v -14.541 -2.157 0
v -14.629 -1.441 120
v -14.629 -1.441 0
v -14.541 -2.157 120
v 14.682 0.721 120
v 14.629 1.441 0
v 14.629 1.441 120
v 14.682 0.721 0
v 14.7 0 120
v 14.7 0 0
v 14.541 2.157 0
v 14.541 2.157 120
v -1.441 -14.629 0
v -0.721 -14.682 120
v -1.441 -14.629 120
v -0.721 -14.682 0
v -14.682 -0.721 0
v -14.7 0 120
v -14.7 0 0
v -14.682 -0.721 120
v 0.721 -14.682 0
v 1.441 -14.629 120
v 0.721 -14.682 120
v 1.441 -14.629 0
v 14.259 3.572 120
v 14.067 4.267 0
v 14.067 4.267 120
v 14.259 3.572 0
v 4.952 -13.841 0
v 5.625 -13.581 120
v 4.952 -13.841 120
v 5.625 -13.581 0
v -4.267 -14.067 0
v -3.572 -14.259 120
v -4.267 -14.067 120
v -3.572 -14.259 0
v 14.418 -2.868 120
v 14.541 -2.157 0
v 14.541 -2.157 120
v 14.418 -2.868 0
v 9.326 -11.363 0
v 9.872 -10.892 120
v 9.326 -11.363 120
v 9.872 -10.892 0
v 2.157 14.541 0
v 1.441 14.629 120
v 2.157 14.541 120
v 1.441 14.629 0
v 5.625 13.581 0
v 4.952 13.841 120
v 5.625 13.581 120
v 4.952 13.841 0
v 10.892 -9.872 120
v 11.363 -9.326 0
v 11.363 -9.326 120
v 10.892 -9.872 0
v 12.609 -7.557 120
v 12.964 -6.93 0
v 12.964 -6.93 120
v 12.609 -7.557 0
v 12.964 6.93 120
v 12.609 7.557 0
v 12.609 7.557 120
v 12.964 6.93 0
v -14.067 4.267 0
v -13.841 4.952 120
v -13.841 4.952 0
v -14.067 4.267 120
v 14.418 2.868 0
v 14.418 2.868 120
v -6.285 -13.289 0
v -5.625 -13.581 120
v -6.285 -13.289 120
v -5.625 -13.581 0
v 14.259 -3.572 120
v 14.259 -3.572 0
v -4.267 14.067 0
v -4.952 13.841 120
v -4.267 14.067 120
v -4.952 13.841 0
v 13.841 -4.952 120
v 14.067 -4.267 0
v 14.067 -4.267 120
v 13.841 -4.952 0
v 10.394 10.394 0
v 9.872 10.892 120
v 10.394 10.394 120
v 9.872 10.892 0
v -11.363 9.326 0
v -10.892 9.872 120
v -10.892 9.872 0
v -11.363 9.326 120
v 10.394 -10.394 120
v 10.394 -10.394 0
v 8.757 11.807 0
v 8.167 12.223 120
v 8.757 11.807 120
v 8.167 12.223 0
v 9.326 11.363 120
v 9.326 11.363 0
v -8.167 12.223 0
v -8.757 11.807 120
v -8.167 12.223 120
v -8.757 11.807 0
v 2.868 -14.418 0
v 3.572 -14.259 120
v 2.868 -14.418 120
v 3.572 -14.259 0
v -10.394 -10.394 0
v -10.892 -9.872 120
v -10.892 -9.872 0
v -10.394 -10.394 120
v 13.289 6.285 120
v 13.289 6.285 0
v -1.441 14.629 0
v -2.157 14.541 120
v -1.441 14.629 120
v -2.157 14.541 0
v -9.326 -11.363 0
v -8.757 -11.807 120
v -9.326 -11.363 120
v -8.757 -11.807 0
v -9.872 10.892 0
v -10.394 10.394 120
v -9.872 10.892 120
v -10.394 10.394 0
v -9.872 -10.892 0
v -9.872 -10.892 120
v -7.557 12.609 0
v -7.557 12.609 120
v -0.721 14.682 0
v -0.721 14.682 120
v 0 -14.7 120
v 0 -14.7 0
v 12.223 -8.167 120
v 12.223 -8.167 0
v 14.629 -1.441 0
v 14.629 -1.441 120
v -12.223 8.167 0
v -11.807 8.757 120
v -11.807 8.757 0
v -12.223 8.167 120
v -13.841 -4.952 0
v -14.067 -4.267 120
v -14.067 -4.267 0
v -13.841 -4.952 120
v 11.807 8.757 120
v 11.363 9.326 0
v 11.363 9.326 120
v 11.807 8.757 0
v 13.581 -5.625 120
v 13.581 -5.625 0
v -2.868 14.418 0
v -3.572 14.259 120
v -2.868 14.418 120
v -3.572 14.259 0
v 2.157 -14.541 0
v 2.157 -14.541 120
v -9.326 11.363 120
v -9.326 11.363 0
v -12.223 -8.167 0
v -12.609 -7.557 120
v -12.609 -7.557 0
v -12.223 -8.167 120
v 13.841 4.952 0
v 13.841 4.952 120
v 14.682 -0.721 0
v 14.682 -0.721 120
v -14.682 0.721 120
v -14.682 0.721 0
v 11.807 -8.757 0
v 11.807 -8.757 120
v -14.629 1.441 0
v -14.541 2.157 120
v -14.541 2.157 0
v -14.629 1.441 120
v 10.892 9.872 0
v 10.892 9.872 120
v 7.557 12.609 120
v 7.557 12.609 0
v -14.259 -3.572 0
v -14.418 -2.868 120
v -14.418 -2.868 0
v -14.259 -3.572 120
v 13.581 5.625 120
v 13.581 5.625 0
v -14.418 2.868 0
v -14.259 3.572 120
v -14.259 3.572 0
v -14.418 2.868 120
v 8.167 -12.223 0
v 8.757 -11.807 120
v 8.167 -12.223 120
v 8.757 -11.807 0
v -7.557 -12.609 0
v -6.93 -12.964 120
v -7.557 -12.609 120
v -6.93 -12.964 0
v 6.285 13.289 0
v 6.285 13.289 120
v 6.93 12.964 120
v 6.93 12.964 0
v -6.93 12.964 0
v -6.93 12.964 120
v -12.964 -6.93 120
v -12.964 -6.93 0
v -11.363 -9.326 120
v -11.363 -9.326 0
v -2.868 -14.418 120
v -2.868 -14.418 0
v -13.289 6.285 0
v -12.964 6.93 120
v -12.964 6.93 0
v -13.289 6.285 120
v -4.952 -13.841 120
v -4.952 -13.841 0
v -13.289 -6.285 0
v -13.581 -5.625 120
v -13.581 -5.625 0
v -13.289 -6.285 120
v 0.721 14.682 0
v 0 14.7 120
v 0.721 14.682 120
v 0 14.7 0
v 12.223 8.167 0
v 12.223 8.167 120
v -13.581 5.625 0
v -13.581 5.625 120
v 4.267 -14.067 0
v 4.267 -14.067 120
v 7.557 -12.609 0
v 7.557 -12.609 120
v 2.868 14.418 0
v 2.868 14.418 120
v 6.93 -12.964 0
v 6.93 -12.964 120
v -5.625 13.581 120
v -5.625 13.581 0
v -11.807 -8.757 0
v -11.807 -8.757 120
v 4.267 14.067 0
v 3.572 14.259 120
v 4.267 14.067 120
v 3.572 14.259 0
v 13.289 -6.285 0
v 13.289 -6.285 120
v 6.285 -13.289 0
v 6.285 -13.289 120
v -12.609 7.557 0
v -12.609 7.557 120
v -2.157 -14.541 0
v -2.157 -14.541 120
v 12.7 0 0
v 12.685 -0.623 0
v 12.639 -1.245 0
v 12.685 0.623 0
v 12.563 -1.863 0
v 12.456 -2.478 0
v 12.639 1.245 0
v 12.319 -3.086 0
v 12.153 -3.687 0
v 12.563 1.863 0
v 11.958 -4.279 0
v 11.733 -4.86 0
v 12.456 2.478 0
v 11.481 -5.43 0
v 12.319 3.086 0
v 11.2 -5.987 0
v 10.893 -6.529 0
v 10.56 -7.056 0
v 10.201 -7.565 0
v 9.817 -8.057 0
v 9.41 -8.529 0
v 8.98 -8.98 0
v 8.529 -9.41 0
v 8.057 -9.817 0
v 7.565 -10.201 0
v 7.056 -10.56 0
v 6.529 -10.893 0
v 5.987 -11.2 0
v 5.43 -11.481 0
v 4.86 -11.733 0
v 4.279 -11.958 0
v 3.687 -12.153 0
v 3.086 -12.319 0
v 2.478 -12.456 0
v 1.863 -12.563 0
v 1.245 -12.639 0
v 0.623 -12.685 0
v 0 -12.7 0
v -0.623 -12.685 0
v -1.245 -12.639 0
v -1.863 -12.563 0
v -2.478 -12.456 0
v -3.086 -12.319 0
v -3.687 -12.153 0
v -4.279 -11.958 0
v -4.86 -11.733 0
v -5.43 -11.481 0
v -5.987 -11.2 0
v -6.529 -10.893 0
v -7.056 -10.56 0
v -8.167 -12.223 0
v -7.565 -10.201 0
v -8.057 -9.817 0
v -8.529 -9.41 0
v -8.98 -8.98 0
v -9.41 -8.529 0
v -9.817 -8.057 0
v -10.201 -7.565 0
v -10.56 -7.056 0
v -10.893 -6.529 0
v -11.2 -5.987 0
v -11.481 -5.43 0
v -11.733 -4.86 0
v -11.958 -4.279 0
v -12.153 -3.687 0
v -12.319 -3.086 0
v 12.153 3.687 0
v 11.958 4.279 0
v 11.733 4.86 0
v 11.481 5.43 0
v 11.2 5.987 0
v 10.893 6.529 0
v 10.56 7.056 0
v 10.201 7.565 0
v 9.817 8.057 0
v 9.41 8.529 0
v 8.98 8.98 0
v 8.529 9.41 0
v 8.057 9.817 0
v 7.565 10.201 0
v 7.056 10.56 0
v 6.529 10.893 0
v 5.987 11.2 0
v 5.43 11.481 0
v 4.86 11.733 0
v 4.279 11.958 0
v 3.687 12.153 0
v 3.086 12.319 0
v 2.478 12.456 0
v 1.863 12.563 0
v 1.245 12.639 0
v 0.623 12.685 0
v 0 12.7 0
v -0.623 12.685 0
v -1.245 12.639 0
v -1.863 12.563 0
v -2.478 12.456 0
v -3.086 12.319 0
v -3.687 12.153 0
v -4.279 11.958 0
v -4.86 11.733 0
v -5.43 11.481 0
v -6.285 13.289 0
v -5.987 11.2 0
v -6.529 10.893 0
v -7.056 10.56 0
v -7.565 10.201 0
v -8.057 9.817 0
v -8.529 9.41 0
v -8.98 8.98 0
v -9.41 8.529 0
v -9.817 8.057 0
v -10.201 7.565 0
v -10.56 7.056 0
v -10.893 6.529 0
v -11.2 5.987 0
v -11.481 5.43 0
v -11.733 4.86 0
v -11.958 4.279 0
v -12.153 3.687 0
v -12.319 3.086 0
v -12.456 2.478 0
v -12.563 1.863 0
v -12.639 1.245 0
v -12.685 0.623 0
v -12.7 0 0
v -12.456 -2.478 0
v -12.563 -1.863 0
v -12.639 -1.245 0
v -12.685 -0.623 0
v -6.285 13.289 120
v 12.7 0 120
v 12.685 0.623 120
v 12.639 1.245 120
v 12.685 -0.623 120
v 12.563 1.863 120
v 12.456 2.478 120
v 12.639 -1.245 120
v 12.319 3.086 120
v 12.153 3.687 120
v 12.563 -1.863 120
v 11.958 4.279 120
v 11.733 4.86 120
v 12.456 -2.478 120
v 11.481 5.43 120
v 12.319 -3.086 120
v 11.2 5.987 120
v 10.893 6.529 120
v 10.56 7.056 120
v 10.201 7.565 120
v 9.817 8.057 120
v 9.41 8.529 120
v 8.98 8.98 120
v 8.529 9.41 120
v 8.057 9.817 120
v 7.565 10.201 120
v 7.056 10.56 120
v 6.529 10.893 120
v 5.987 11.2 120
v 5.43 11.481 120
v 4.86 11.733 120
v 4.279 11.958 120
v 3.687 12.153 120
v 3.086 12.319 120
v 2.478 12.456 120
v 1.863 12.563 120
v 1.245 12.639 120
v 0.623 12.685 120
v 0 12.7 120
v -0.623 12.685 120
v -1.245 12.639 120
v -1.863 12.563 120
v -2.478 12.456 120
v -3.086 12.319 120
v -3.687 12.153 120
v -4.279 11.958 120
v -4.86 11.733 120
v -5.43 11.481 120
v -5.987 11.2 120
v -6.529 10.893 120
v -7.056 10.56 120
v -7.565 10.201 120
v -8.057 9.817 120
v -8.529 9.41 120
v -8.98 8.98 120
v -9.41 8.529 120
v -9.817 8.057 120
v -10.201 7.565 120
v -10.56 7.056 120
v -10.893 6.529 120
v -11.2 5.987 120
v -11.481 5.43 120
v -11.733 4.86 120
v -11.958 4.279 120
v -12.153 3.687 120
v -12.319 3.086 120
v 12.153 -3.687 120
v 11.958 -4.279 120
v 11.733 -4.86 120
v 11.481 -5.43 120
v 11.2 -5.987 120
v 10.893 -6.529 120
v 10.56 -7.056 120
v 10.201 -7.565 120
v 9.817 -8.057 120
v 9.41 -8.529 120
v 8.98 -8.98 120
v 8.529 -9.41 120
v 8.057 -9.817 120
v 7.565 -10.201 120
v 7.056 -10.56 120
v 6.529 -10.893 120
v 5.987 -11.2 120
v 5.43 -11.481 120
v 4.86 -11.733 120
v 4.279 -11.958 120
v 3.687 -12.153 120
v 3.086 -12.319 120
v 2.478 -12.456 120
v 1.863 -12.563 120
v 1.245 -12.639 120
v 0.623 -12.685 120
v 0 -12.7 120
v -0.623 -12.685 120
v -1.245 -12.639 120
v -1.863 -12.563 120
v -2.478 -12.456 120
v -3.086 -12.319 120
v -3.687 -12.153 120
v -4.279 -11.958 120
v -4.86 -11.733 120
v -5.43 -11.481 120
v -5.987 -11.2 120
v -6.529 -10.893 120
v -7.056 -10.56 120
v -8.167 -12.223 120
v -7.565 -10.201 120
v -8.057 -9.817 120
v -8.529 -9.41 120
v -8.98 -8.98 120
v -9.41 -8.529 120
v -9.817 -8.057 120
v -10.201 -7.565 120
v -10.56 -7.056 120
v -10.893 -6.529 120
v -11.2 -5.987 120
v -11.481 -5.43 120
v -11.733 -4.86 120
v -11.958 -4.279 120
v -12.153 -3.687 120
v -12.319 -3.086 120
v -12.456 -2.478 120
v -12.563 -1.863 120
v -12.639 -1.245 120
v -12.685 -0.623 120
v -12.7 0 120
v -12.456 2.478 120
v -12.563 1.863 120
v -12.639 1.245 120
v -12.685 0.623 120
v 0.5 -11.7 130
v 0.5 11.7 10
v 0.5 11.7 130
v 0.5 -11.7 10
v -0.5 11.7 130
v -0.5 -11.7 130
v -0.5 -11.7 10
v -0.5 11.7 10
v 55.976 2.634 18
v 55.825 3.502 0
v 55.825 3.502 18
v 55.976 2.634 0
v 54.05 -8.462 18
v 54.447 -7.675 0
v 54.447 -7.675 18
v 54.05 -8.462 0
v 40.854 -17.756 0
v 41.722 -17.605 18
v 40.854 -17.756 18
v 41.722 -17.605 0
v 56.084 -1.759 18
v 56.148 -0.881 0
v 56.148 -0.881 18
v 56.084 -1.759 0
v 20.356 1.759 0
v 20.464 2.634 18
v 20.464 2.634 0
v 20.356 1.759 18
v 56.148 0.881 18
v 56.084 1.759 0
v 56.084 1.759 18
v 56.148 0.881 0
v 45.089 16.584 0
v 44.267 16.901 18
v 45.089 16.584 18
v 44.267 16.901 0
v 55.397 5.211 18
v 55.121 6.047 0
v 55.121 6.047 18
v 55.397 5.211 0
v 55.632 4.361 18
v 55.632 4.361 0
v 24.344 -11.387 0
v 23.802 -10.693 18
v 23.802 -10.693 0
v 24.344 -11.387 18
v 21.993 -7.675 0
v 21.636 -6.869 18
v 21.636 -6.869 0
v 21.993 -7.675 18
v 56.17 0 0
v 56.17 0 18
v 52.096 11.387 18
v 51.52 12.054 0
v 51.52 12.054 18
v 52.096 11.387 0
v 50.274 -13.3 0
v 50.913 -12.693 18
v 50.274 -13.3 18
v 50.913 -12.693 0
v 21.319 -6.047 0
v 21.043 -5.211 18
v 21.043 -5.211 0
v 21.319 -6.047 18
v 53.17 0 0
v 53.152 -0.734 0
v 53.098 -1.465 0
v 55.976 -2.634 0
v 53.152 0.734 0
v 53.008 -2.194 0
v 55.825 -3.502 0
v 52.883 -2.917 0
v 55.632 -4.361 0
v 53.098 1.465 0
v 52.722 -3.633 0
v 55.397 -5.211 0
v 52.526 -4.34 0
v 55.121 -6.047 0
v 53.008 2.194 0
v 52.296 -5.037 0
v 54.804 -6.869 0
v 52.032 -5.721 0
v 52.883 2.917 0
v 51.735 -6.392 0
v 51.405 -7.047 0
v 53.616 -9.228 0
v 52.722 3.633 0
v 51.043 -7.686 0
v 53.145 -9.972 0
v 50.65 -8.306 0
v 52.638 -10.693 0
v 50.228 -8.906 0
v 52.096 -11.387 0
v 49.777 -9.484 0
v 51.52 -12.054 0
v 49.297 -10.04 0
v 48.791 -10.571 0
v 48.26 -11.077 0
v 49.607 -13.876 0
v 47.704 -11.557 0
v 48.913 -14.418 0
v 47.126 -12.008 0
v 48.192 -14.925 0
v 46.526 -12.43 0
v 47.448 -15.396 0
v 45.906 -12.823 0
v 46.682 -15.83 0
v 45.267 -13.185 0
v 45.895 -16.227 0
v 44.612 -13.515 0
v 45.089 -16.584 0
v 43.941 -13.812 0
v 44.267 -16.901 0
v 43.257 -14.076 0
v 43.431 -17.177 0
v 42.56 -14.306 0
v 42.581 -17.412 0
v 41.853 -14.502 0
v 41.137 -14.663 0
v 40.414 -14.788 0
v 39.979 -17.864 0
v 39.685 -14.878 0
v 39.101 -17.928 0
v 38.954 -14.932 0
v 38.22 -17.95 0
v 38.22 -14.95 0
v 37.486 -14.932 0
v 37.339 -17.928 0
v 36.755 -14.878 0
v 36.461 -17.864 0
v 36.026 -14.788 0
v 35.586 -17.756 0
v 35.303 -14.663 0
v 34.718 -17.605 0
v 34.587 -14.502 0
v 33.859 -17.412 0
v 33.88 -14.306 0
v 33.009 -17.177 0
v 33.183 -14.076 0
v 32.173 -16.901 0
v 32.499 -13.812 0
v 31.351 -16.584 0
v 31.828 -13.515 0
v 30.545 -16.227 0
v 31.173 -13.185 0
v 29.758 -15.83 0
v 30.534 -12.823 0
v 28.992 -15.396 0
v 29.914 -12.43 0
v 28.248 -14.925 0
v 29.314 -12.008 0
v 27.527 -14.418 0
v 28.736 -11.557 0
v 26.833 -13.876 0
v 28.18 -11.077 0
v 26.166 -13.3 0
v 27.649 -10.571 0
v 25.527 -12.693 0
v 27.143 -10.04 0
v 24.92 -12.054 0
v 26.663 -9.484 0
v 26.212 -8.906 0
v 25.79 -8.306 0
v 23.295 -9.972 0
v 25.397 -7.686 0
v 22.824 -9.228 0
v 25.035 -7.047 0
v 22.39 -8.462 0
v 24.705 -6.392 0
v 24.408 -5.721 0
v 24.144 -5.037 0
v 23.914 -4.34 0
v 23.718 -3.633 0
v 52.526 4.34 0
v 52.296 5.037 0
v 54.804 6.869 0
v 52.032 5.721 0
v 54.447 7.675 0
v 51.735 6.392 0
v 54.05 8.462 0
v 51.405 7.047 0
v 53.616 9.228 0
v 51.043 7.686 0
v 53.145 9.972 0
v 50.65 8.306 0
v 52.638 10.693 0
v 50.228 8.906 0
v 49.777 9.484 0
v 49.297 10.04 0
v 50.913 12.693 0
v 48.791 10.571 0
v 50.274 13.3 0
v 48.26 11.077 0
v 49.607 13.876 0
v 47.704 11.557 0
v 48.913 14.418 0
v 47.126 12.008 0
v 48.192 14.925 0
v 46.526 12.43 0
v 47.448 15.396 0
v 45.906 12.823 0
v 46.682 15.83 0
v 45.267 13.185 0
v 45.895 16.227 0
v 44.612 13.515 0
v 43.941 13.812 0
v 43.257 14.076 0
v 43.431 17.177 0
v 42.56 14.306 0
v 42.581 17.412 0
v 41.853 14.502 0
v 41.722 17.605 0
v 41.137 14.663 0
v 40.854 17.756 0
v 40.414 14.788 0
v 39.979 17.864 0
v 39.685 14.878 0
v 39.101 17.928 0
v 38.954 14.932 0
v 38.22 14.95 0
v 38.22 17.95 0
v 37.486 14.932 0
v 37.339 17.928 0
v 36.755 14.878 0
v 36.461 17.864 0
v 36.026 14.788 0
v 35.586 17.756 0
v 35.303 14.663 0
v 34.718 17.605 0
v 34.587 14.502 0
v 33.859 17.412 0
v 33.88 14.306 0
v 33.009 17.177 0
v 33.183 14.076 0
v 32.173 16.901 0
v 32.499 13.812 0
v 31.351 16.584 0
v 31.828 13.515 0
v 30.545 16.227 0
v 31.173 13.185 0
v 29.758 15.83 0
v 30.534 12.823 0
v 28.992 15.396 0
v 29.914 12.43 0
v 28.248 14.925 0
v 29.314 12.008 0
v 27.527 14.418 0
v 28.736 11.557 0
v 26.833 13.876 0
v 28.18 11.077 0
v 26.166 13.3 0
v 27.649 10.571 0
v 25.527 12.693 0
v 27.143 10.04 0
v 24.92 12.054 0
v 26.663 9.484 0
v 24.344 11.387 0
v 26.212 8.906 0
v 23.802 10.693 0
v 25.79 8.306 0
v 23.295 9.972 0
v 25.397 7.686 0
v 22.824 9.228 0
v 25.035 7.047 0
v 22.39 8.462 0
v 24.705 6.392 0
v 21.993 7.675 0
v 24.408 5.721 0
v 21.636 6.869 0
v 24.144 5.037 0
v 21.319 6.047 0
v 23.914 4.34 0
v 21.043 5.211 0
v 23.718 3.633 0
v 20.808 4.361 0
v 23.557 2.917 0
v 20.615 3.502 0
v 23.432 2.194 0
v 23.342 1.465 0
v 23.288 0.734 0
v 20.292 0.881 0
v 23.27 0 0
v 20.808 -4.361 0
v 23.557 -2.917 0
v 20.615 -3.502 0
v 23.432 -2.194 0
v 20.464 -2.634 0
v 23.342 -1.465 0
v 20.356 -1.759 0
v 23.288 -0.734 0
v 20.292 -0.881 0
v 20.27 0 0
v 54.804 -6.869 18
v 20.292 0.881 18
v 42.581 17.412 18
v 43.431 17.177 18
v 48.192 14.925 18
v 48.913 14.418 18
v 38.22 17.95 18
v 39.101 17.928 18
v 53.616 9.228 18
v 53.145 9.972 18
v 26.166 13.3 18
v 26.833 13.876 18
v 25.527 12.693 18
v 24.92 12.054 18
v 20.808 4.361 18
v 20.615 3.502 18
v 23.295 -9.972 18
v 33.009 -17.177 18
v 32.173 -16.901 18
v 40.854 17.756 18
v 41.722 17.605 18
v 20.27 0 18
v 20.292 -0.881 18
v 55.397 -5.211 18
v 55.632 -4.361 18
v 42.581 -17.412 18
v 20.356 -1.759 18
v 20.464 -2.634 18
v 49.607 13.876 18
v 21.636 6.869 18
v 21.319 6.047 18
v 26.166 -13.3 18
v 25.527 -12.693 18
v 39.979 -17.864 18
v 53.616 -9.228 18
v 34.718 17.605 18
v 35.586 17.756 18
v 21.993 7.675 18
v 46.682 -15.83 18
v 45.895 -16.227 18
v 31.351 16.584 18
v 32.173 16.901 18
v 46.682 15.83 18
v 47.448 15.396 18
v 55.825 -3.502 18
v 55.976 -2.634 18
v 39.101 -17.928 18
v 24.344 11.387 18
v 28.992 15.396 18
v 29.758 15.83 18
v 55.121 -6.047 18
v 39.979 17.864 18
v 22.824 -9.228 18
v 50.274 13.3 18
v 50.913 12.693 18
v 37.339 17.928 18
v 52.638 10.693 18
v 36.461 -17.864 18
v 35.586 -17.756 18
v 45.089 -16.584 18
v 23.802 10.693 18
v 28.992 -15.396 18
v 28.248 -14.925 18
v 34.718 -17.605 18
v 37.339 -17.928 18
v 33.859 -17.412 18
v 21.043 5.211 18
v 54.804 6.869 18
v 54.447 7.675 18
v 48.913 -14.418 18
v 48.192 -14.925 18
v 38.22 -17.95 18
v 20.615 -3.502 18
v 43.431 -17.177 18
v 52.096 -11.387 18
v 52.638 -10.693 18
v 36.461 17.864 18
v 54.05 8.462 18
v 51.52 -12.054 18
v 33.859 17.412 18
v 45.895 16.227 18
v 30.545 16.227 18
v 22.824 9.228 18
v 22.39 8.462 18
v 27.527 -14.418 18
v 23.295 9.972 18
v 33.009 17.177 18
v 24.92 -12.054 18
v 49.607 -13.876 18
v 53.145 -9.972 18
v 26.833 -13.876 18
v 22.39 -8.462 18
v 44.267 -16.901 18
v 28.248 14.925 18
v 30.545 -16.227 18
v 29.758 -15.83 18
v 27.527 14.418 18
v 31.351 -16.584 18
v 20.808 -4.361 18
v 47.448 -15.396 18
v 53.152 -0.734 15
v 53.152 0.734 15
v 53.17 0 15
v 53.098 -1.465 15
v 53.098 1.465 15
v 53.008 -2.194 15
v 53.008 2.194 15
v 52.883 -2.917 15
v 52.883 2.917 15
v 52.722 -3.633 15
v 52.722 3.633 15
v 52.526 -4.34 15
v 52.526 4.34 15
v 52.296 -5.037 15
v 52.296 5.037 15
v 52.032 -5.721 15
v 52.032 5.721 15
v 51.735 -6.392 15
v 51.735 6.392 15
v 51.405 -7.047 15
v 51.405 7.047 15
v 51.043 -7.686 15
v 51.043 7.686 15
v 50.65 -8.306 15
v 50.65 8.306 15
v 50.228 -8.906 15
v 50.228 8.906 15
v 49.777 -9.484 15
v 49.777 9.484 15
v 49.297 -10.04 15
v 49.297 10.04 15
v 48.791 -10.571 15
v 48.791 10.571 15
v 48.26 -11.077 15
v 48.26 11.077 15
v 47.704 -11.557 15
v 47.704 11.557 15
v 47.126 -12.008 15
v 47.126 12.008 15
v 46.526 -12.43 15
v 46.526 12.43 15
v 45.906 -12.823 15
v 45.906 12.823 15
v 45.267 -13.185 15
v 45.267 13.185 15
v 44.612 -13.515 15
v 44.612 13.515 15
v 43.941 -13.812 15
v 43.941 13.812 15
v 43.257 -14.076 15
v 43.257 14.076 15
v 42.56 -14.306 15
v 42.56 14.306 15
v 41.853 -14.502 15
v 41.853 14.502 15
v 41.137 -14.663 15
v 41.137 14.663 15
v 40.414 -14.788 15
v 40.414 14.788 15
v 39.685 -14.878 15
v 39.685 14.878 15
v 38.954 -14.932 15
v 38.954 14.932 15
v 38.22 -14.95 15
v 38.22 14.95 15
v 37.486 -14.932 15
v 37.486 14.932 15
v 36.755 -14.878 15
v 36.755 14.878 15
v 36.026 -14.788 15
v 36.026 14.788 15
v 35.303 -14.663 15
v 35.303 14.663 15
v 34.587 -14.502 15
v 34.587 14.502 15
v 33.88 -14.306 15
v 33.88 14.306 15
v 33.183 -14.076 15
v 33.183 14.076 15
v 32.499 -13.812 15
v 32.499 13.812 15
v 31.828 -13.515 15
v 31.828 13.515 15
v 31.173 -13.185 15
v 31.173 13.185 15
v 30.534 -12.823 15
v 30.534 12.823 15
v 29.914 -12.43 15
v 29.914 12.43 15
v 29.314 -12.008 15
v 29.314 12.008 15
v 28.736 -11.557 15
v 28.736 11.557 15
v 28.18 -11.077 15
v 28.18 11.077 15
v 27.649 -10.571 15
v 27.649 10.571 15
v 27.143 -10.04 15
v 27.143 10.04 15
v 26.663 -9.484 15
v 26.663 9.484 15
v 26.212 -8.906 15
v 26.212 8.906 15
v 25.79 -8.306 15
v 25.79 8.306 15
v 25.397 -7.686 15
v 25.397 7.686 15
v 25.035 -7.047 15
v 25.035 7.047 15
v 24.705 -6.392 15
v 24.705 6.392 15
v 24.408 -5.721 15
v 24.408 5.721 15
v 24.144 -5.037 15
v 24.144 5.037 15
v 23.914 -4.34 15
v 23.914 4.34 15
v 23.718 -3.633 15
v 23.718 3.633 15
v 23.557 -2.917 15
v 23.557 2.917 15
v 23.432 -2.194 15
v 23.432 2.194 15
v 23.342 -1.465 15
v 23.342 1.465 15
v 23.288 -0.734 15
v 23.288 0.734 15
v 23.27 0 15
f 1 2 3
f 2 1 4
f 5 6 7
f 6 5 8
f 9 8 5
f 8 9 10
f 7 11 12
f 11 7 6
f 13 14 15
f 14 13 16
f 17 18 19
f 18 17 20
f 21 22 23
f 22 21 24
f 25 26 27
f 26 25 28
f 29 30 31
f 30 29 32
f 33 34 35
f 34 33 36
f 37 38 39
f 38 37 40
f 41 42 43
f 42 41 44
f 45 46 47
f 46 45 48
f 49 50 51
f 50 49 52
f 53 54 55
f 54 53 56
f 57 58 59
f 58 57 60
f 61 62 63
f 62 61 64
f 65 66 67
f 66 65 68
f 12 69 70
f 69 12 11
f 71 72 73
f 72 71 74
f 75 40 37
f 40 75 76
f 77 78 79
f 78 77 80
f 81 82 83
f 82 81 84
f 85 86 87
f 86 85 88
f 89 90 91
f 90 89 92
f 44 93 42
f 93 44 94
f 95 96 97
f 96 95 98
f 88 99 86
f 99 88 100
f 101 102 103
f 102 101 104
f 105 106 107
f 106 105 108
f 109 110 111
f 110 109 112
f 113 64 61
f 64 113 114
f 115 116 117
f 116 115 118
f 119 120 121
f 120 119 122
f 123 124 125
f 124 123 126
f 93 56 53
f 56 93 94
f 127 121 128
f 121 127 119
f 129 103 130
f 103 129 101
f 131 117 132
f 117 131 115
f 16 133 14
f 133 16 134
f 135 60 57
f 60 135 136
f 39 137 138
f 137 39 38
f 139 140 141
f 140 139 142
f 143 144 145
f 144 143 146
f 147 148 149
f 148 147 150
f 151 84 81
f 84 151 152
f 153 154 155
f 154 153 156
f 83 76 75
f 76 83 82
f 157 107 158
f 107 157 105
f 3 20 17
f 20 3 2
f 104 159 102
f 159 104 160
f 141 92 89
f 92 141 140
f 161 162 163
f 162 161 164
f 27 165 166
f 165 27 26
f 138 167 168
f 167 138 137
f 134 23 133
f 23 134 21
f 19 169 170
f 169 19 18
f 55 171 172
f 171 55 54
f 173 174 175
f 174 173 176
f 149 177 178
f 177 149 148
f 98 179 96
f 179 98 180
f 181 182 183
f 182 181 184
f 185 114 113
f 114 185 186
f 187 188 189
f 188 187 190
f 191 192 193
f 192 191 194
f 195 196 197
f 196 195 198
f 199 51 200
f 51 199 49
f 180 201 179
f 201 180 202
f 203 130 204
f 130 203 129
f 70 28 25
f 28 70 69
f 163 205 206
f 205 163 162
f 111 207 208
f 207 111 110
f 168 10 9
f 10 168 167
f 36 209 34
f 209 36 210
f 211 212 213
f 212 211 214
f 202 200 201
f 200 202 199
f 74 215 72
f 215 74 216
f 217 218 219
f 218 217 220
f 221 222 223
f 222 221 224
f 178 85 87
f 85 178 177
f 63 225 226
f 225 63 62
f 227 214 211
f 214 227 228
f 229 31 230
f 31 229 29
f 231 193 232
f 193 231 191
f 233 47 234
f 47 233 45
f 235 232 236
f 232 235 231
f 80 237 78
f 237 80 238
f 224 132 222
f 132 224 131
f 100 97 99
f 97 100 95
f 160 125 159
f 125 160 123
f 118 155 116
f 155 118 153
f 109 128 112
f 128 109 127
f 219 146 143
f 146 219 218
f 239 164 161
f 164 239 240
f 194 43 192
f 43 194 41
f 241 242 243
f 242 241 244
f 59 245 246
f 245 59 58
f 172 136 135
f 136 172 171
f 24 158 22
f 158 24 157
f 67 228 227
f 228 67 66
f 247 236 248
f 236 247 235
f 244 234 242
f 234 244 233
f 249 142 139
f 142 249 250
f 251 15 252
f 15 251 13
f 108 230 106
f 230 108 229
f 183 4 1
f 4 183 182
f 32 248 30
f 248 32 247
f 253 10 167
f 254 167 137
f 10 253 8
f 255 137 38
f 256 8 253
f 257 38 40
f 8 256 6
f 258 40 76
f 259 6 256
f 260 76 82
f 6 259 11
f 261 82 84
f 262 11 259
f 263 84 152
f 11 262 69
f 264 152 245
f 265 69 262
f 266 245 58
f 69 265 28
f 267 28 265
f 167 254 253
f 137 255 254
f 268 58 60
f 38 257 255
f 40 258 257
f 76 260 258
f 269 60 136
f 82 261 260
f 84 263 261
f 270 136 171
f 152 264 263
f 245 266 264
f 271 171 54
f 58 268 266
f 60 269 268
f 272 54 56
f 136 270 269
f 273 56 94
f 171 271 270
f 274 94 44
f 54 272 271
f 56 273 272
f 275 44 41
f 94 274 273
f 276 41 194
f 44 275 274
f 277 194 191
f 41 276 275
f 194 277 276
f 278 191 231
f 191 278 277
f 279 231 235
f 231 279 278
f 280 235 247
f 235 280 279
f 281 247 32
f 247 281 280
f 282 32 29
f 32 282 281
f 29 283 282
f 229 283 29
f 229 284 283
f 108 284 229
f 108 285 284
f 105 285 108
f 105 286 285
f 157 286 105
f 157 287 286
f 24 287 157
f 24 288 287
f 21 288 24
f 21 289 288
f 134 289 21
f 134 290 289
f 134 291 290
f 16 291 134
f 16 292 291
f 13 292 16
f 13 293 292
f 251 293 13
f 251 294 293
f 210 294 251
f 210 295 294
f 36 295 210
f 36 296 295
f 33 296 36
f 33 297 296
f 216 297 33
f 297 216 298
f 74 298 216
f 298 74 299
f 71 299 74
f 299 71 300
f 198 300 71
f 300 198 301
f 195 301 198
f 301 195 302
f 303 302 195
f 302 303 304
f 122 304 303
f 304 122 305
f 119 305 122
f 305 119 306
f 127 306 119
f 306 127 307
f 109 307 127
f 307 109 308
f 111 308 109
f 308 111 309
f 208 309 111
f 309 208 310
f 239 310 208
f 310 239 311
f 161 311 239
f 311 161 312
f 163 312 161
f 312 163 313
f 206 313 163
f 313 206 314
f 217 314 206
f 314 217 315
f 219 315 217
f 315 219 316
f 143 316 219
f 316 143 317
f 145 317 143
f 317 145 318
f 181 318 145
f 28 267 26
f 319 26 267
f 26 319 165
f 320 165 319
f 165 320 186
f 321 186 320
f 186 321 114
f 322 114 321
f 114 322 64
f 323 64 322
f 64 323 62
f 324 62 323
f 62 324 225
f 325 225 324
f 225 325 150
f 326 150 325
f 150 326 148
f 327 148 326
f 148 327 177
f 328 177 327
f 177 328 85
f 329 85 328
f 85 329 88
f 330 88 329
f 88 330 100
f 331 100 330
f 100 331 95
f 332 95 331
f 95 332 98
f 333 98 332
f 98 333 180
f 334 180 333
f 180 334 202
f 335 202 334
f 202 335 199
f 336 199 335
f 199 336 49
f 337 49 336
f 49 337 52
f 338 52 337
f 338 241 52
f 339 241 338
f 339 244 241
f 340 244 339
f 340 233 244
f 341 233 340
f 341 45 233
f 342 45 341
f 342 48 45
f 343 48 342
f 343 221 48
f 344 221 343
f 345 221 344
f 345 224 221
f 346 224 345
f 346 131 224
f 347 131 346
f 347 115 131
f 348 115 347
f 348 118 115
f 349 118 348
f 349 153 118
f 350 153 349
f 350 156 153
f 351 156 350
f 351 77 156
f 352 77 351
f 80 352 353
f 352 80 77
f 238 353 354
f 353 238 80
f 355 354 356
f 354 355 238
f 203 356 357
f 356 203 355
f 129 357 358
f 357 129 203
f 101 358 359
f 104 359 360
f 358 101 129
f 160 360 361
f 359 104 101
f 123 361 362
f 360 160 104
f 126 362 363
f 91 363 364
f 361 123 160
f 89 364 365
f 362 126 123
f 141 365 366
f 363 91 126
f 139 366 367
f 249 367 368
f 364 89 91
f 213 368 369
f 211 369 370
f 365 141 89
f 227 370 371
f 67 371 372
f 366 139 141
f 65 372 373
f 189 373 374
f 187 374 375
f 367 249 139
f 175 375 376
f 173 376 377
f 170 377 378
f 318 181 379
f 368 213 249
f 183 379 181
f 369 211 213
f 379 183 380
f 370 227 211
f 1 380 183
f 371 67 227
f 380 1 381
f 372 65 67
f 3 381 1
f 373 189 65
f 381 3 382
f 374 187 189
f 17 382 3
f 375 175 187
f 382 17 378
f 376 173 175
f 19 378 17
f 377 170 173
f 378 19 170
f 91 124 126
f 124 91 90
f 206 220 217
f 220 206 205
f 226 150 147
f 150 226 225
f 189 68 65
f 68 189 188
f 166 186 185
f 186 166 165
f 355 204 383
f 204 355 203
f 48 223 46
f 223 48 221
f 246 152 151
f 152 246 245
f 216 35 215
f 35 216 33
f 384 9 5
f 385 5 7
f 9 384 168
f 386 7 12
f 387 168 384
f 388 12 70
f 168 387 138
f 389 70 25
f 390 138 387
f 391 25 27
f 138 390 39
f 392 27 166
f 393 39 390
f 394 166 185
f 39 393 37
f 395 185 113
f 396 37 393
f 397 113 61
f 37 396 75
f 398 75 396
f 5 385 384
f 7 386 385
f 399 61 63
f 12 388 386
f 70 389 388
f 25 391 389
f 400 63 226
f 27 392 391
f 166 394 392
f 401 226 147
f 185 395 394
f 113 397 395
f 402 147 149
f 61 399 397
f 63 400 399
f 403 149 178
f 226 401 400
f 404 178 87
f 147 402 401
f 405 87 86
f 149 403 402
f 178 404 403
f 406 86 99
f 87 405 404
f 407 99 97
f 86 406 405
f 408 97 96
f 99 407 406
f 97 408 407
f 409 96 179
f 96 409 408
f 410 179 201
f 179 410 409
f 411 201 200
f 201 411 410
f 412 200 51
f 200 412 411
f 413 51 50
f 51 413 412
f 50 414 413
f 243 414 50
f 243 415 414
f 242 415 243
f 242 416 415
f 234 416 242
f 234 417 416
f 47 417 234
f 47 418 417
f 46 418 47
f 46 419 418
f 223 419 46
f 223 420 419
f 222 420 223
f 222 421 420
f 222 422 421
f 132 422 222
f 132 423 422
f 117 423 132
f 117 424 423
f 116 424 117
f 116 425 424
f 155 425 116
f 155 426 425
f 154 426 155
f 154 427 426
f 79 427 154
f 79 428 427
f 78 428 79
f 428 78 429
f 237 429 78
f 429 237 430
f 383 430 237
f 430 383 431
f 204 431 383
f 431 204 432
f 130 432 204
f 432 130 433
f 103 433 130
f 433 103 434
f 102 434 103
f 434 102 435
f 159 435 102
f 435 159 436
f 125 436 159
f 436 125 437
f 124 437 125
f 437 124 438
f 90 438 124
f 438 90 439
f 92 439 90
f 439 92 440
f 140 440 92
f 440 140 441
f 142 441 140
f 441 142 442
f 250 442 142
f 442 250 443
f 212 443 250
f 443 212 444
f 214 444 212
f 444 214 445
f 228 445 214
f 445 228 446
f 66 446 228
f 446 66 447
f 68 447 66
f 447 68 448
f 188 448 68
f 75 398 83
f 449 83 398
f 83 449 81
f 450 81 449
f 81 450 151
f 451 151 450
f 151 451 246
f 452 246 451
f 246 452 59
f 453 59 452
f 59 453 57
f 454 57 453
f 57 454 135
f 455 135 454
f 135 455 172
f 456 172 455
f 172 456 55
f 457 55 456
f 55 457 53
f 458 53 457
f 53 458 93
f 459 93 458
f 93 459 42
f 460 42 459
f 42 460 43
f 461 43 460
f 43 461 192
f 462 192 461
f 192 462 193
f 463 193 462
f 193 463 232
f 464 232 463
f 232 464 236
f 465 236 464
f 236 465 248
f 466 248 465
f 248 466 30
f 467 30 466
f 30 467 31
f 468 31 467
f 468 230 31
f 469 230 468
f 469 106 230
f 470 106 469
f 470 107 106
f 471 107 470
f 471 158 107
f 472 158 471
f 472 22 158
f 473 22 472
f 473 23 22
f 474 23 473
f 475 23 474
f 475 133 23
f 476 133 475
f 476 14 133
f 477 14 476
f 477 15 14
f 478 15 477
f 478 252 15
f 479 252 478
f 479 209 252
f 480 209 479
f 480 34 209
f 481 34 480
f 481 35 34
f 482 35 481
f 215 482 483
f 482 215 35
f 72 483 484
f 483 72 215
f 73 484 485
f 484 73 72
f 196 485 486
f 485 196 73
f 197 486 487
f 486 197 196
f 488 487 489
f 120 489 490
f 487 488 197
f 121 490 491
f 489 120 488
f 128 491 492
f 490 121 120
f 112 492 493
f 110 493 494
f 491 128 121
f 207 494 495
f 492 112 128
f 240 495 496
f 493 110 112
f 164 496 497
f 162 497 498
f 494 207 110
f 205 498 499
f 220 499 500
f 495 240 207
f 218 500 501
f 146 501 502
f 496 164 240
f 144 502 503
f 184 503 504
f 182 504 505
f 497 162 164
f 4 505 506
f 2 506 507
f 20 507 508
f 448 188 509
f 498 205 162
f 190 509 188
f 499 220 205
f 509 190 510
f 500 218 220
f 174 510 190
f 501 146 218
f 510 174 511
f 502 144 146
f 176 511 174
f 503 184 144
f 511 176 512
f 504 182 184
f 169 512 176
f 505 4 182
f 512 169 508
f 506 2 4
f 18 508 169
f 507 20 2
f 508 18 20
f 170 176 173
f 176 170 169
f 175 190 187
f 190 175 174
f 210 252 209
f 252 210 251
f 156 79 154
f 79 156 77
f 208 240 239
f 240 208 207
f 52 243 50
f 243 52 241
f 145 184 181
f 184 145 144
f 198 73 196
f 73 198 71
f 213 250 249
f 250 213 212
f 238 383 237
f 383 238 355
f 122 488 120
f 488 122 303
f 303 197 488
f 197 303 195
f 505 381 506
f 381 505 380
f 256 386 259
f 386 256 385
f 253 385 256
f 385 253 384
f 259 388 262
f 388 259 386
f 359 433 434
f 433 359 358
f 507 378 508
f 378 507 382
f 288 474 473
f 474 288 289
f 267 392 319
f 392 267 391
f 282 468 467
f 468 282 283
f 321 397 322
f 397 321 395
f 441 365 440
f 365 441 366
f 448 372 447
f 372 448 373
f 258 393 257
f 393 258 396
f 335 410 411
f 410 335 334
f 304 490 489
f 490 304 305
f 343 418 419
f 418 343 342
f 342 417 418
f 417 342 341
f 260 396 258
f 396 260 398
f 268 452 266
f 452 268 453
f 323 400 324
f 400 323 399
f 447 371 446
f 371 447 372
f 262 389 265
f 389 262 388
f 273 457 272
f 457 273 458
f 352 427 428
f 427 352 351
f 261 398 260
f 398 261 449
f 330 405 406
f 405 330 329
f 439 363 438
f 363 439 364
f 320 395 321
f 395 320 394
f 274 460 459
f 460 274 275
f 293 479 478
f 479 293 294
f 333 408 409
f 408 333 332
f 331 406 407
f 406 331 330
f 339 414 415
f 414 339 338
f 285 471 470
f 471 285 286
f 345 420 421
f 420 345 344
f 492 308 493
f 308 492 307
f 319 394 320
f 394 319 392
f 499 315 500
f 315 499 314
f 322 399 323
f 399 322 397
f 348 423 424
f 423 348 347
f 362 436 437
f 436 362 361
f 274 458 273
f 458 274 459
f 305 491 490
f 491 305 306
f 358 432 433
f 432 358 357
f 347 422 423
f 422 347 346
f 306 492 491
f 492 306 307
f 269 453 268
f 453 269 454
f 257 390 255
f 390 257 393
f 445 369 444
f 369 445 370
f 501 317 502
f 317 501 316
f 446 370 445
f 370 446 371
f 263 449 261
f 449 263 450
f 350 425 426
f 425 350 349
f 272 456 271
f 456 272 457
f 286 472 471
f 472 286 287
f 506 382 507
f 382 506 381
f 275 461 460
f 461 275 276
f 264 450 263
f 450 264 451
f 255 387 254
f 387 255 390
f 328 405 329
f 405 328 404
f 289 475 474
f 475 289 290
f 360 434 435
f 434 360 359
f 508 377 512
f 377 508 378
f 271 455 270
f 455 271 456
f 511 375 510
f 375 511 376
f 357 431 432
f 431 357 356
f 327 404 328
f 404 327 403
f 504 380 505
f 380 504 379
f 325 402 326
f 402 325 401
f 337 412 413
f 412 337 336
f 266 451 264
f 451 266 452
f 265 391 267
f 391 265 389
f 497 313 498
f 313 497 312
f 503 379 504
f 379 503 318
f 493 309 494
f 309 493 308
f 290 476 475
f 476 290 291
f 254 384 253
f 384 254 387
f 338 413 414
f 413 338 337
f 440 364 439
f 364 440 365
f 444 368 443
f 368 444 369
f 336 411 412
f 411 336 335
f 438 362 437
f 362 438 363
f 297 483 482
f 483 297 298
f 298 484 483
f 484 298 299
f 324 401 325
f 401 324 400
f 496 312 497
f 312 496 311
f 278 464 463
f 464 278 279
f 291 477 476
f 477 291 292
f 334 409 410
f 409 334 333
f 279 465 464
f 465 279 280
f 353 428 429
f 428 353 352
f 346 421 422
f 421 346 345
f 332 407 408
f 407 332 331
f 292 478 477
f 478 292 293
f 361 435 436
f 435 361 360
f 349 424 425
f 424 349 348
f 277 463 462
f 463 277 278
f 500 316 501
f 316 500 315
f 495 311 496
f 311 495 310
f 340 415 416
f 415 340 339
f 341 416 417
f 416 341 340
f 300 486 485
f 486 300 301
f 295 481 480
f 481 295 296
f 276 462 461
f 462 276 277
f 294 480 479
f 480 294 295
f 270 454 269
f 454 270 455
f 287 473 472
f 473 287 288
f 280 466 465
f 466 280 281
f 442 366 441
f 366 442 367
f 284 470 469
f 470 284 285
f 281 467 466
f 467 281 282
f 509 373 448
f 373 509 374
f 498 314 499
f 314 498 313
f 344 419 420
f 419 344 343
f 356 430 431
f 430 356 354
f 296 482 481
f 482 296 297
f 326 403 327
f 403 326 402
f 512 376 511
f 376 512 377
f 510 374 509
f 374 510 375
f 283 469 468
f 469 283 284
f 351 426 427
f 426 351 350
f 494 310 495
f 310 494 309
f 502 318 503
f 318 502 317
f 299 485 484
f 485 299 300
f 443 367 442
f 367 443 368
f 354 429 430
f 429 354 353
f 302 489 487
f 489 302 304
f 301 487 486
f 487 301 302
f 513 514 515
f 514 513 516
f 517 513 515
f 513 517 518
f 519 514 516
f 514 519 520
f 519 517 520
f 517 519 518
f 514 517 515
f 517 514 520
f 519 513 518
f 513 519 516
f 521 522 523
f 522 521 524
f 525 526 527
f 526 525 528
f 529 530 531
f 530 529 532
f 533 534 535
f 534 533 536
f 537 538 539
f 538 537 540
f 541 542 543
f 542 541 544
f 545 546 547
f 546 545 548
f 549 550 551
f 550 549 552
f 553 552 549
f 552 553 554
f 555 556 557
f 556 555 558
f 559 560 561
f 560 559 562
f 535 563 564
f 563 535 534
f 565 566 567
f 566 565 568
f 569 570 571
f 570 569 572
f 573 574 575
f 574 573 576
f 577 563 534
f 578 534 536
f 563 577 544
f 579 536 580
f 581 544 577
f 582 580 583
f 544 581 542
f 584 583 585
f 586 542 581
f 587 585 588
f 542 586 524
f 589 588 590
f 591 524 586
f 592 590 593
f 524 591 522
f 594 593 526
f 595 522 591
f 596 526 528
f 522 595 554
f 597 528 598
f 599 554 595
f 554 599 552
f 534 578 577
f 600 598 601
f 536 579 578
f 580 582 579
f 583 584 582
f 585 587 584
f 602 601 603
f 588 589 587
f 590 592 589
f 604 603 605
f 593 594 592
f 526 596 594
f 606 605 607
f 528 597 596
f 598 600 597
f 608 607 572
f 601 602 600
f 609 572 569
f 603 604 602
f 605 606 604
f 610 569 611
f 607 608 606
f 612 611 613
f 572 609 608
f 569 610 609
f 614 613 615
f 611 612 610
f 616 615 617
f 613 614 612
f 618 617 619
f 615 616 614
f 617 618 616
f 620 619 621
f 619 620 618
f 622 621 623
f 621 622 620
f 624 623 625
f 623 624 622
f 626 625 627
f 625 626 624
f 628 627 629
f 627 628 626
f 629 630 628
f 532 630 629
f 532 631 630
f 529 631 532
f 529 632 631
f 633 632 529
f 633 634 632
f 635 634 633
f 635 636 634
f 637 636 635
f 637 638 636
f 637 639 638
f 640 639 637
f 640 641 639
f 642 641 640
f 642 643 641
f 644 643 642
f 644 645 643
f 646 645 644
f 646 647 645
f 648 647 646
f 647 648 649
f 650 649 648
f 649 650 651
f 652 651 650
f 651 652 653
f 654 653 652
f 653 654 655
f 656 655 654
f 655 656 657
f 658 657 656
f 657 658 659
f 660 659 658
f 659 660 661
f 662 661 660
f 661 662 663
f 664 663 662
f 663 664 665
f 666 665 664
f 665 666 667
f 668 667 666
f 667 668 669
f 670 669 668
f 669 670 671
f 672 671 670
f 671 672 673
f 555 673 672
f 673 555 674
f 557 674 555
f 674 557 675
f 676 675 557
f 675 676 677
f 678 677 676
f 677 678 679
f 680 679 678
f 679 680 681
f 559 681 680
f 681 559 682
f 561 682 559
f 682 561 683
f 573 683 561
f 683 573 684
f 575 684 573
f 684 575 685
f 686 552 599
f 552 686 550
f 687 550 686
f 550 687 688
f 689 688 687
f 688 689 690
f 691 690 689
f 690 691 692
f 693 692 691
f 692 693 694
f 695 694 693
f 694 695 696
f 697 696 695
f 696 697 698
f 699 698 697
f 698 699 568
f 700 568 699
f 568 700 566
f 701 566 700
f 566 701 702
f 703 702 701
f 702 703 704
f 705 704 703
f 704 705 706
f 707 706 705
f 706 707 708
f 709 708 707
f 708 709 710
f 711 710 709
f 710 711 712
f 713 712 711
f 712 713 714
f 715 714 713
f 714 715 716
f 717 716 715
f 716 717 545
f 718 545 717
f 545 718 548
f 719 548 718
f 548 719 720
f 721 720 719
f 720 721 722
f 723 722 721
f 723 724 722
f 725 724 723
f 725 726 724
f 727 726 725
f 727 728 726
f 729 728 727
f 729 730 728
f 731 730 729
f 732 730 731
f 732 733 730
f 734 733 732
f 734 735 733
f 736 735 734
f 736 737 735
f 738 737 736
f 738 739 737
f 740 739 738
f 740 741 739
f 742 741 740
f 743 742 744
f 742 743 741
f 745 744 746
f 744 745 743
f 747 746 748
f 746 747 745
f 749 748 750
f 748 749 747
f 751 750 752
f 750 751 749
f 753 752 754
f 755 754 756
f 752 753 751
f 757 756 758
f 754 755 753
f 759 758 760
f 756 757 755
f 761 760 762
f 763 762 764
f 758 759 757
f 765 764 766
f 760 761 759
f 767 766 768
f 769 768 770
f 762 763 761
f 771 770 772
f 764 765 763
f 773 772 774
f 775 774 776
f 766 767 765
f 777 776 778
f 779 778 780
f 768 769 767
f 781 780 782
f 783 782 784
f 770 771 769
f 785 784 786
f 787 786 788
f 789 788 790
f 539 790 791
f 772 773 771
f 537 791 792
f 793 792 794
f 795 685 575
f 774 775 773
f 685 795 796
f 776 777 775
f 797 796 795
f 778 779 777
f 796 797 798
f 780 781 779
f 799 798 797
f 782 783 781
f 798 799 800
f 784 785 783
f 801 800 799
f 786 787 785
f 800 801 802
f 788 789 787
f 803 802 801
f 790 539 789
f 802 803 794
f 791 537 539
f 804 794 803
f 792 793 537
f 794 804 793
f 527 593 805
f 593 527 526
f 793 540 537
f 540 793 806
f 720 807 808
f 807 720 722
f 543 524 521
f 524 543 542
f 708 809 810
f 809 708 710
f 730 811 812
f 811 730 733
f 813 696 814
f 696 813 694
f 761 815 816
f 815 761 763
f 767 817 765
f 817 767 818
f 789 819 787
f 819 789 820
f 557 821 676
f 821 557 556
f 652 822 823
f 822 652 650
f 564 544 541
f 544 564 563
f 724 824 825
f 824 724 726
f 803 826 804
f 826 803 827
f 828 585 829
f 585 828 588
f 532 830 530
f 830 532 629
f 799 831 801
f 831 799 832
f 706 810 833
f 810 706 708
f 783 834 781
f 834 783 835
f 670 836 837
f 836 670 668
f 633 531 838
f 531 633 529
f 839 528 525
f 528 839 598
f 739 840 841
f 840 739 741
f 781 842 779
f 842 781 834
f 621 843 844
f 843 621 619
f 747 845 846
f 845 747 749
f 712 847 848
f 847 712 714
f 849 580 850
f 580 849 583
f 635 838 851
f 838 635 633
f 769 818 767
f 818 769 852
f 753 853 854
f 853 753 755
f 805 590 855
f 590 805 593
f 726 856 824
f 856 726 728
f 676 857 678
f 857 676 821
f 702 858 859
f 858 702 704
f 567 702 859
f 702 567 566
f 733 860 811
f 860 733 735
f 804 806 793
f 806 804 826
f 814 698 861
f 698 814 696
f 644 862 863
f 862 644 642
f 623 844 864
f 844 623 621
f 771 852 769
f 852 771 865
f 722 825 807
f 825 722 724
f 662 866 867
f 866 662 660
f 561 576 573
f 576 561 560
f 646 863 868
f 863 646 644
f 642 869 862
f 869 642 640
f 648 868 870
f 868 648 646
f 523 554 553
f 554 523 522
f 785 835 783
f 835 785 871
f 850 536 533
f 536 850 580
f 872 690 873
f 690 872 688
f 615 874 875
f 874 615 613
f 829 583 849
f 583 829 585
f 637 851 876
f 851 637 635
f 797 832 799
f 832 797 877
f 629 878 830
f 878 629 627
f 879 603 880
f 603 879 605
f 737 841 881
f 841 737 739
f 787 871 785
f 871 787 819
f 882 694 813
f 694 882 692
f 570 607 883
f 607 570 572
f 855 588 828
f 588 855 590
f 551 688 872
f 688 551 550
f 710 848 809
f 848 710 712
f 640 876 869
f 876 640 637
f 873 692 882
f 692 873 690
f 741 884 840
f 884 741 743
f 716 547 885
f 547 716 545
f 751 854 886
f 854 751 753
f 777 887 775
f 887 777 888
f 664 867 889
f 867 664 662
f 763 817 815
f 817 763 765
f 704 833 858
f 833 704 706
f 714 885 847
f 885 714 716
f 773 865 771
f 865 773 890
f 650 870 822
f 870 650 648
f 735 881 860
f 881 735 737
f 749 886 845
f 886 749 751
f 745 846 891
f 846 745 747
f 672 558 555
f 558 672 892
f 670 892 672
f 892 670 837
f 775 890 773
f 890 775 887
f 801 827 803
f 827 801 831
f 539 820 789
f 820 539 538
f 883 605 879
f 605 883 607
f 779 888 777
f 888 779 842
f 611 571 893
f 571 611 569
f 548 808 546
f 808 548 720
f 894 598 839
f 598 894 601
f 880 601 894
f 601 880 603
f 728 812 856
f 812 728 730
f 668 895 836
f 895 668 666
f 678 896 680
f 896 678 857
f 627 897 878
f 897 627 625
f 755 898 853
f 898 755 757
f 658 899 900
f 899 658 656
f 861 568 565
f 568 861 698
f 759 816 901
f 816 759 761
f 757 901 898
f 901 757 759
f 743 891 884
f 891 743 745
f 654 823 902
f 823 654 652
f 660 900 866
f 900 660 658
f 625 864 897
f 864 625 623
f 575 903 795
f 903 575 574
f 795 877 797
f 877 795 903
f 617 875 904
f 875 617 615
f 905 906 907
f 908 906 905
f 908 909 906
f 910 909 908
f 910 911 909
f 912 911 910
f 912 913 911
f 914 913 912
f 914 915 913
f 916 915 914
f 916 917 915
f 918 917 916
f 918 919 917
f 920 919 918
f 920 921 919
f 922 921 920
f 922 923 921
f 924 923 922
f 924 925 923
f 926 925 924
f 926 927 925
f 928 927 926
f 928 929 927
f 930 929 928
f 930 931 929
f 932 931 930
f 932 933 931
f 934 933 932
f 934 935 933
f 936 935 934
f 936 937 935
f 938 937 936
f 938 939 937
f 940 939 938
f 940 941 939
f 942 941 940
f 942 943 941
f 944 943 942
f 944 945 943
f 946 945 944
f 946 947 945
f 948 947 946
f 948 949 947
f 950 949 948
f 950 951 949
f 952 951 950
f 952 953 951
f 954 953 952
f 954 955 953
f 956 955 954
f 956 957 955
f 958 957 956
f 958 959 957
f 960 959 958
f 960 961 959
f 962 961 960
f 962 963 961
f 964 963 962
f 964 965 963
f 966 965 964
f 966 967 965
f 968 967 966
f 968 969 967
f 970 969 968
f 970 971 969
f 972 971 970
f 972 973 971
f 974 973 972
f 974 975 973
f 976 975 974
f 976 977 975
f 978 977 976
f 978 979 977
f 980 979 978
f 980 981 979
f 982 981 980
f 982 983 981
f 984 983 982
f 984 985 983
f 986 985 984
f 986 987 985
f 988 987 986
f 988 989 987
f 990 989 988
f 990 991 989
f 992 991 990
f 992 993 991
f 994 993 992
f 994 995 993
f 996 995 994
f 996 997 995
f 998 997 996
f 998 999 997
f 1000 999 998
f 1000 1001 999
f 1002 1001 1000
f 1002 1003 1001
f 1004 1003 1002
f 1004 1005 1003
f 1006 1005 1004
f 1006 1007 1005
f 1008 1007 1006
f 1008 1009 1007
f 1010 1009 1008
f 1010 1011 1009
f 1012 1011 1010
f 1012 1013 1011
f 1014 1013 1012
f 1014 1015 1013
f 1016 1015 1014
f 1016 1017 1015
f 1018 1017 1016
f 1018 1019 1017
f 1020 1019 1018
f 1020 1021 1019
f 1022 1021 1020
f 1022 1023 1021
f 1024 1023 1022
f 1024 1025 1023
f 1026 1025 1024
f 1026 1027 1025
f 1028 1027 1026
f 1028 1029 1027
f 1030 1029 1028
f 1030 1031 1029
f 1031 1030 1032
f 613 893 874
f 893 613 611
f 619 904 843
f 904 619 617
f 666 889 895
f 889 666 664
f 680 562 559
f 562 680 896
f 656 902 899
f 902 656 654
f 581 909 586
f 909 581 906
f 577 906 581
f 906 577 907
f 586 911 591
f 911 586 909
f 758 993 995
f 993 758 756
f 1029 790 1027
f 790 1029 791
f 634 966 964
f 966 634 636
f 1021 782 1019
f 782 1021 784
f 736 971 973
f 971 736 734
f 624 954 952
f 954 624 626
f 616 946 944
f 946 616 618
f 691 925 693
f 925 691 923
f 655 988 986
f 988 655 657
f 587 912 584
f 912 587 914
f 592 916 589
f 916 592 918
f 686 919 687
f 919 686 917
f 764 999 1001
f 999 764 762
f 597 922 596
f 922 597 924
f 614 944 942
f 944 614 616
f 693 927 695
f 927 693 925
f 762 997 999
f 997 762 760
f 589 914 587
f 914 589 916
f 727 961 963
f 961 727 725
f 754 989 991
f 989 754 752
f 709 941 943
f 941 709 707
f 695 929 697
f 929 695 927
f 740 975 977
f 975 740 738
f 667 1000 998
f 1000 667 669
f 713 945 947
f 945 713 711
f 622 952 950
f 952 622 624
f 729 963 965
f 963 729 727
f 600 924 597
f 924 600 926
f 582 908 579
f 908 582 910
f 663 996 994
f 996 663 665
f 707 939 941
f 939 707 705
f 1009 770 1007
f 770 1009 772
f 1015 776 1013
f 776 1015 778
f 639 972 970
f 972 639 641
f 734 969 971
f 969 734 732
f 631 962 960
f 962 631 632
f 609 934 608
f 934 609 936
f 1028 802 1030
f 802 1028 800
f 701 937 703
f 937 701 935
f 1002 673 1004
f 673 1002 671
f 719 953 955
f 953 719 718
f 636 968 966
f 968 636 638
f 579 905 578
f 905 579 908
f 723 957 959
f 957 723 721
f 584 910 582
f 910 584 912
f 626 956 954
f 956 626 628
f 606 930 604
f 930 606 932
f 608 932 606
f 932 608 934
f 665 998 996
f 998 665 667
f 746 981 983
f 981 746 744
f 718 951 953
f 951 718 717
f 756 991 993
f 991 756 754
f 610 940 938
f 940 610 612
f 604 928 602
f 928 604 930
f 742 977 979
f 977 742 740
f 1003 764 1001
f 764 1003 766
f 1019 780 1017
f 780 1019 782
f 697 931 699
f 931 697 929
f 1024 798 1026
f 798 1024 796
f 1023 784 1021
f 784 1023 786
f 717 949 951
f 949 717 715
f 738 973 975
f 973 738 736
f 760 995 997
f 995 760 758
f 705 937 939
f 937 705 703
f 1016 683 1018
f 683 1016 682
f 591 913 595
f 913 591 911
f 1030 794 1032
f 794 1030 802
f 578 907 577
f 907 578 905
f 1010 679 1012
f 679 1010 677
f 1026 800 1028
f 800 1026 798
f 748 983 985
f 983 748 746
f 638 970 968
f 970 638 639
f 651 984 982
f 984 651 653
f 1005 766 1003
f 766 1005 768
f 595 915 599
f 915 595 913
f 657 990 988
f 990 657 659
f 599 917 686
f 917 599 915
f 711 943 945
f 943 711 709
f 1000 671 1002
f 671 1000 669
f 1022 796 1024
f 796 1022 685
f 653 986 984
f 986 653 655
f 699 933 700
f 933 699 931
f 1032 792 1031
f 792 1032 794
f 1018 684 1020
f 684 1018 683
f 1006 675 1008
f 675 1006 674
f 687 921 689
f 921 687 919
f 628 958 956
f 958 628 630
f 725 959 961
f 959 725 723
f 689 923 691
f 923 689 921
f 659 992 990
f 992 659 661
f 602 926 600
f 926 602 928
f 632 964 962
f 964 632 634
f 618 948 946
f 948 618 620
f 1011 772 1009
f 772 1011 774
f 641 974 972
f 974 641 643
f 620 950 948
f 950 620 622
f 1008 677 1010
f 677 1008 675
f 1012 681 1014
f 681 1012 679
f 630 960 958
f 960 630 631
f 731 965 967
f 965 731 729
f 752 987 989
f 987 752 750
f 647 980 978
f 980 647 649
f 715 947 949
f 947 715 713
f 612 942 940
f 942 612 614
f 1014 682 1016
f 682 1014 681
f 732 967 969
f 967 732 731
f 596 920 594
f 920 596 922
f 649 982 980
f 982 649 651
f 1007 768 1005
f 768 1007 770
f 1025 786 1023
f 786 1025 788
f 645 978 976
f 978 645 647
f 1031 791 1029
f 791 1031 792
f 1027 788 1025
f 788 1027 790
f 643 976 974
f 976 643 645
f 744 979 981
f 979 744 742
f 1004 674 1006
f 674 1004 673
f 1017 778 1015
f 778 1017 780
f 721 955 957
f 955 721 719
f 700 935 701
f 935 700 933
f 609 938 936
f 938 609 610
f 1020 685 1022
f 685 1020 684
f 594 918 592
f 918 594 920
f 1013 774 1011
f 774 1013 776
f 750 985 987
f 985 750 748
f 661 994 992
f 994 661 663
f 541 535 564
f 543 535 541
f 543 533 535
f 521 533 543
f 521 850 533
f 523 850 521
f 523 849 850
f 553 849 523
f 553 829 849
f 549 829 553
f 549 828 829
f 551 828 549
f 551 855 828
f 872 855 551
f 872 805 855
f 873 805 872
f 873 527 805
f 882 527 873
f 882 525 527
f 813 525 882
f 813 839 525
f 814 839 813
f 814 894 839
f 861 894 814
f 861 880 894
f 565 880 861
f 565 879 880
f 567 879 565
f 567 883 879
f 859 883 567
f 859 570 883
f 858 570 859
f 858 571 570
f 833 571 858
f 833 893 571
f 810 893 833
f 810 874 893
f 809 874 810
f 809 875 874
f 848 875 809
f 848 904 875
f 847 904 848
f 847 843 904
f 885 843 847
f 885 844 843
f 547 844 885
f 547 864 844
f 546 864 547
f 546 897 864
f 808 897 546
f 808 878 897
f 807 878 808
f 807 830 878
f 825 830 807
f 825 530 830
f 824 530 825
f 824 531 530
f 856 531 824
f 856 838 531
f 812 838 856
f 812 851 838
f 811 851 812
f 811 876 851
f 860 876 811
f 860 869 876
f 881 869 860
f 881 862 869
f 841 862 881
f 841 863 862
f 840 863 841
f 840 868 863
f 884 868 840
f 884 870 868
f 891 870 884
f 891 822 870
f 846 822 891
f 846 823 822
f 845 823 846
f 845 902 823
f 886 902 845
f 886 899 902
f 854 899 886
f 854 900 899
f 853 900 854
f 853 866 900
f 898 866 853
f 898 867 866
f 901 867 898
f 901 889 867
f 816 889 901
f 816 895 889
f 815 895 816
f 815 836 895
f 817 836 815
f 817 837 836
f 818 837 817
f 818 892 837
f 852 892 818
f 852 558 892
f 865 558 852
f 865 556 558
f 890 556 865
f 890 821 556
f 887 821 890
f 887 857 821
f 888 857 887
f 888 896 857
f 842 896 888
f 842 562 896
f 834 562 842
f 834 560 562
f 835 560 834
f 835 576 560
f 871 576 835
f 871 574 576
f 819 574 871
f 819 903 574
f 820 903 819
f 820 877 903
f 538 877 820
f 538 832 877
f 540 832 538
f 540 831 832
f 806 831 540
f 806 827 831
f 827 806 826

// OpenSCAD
// 1-inch Pipe + Internal "PCB" (OpenSCAD)
// Units: mm (1 inch = 25.4 mm)
$fn = 128;

// ===== Parameters =====
inner_d_inch   = 1;           // nominal inner diameter (inches)
inner_d        = inner_d_inch * 25.4;
pipe_len       = 120;         // pipe length (mm)
wall           = 2.0;         // pipe wall thickness
chamfer        = 0.8;         // small outer bevel at the top

// Cap (slip-on) params
cap_wall       = 3.0;
cap_top_thick  = 3.0;
cap_depth      = 15.0;
clearance      = 0.25;        // slip fit for cap over pipe OD

// Internal "PCB" (green) params
pcb_gap        = 1.0;         // clearance from inner wall
pcb_thickness  = 1.0;         // typical PCB thickness
pcb_width      = inner_d - 2*pcb_gap;
pcb_height     = pipe_len;    // reach top

// ===== Derived =====
outer_d        = inner_d + 2*wall;
cap_inner_d    = outer_d + 2*clearance;
cap_outer_d    = cap_inner_d + 2*cap_wall;

// ===== Helpers =====
module ring_cyl(od, id, h) {
    difference() { cylinder(d=od, h=h); cylinder(d=id, h=h+0.2); }
}

// ===== Parts =====
// Pipe body (open bore end-to-end)
module pipe() {
    color([0.8, 0.9, 1.0])  // light PVC bluish-gray
    difference() {
        cylinder(d=outer_d, h=pipe_len);
        translate([0,0,-0.1]) cylinder(d=inner_d, h=pipe_len+0.2);
    }
    // small external chamfer at the top rim
   // translate([0,0,pipe_len - chamfer])
     //   ring_cyl(outer_d, outer_d - 2*chamfer, chamfer);
}

// Internal vertical PCB board
module pcb_board() {
    color([0.0, 4.5, 0.4])  // bright green
    translate([-pcb_thickness/2, -pcb_width/2, 10])  // anchor at bottom
            cube([pcb_thickness, pcb_width, pcb_height], center=false);
}

// Cap (slip-on)
module cap() {
    union() {
        color([0.8, 0.9, 1.0])  // PVC same as pipe
        ring_cyl(cap_outer_d, cap_inner_d, cap_depth);
        translate([0,0,cap_depth]) color([0.8, 0.9, 1.0])
        cylinder(d=cap_outer_d, h=cap_top_thick);
        // small entry bevel
        color([0.8, 0.9, 1.0])  // PVC same as pipe
        ring_cyl(cap_outer_d, cap_outer_d - 2*chamfer, chamfer);
    }
}

// ===== Arrange on build plate =====
// Pipe + internal PCB
union() {
    pipe();
    pcb_board();
}

// Place cap to the side
translate([outer_d*1.3, 0, 0]) cap();
